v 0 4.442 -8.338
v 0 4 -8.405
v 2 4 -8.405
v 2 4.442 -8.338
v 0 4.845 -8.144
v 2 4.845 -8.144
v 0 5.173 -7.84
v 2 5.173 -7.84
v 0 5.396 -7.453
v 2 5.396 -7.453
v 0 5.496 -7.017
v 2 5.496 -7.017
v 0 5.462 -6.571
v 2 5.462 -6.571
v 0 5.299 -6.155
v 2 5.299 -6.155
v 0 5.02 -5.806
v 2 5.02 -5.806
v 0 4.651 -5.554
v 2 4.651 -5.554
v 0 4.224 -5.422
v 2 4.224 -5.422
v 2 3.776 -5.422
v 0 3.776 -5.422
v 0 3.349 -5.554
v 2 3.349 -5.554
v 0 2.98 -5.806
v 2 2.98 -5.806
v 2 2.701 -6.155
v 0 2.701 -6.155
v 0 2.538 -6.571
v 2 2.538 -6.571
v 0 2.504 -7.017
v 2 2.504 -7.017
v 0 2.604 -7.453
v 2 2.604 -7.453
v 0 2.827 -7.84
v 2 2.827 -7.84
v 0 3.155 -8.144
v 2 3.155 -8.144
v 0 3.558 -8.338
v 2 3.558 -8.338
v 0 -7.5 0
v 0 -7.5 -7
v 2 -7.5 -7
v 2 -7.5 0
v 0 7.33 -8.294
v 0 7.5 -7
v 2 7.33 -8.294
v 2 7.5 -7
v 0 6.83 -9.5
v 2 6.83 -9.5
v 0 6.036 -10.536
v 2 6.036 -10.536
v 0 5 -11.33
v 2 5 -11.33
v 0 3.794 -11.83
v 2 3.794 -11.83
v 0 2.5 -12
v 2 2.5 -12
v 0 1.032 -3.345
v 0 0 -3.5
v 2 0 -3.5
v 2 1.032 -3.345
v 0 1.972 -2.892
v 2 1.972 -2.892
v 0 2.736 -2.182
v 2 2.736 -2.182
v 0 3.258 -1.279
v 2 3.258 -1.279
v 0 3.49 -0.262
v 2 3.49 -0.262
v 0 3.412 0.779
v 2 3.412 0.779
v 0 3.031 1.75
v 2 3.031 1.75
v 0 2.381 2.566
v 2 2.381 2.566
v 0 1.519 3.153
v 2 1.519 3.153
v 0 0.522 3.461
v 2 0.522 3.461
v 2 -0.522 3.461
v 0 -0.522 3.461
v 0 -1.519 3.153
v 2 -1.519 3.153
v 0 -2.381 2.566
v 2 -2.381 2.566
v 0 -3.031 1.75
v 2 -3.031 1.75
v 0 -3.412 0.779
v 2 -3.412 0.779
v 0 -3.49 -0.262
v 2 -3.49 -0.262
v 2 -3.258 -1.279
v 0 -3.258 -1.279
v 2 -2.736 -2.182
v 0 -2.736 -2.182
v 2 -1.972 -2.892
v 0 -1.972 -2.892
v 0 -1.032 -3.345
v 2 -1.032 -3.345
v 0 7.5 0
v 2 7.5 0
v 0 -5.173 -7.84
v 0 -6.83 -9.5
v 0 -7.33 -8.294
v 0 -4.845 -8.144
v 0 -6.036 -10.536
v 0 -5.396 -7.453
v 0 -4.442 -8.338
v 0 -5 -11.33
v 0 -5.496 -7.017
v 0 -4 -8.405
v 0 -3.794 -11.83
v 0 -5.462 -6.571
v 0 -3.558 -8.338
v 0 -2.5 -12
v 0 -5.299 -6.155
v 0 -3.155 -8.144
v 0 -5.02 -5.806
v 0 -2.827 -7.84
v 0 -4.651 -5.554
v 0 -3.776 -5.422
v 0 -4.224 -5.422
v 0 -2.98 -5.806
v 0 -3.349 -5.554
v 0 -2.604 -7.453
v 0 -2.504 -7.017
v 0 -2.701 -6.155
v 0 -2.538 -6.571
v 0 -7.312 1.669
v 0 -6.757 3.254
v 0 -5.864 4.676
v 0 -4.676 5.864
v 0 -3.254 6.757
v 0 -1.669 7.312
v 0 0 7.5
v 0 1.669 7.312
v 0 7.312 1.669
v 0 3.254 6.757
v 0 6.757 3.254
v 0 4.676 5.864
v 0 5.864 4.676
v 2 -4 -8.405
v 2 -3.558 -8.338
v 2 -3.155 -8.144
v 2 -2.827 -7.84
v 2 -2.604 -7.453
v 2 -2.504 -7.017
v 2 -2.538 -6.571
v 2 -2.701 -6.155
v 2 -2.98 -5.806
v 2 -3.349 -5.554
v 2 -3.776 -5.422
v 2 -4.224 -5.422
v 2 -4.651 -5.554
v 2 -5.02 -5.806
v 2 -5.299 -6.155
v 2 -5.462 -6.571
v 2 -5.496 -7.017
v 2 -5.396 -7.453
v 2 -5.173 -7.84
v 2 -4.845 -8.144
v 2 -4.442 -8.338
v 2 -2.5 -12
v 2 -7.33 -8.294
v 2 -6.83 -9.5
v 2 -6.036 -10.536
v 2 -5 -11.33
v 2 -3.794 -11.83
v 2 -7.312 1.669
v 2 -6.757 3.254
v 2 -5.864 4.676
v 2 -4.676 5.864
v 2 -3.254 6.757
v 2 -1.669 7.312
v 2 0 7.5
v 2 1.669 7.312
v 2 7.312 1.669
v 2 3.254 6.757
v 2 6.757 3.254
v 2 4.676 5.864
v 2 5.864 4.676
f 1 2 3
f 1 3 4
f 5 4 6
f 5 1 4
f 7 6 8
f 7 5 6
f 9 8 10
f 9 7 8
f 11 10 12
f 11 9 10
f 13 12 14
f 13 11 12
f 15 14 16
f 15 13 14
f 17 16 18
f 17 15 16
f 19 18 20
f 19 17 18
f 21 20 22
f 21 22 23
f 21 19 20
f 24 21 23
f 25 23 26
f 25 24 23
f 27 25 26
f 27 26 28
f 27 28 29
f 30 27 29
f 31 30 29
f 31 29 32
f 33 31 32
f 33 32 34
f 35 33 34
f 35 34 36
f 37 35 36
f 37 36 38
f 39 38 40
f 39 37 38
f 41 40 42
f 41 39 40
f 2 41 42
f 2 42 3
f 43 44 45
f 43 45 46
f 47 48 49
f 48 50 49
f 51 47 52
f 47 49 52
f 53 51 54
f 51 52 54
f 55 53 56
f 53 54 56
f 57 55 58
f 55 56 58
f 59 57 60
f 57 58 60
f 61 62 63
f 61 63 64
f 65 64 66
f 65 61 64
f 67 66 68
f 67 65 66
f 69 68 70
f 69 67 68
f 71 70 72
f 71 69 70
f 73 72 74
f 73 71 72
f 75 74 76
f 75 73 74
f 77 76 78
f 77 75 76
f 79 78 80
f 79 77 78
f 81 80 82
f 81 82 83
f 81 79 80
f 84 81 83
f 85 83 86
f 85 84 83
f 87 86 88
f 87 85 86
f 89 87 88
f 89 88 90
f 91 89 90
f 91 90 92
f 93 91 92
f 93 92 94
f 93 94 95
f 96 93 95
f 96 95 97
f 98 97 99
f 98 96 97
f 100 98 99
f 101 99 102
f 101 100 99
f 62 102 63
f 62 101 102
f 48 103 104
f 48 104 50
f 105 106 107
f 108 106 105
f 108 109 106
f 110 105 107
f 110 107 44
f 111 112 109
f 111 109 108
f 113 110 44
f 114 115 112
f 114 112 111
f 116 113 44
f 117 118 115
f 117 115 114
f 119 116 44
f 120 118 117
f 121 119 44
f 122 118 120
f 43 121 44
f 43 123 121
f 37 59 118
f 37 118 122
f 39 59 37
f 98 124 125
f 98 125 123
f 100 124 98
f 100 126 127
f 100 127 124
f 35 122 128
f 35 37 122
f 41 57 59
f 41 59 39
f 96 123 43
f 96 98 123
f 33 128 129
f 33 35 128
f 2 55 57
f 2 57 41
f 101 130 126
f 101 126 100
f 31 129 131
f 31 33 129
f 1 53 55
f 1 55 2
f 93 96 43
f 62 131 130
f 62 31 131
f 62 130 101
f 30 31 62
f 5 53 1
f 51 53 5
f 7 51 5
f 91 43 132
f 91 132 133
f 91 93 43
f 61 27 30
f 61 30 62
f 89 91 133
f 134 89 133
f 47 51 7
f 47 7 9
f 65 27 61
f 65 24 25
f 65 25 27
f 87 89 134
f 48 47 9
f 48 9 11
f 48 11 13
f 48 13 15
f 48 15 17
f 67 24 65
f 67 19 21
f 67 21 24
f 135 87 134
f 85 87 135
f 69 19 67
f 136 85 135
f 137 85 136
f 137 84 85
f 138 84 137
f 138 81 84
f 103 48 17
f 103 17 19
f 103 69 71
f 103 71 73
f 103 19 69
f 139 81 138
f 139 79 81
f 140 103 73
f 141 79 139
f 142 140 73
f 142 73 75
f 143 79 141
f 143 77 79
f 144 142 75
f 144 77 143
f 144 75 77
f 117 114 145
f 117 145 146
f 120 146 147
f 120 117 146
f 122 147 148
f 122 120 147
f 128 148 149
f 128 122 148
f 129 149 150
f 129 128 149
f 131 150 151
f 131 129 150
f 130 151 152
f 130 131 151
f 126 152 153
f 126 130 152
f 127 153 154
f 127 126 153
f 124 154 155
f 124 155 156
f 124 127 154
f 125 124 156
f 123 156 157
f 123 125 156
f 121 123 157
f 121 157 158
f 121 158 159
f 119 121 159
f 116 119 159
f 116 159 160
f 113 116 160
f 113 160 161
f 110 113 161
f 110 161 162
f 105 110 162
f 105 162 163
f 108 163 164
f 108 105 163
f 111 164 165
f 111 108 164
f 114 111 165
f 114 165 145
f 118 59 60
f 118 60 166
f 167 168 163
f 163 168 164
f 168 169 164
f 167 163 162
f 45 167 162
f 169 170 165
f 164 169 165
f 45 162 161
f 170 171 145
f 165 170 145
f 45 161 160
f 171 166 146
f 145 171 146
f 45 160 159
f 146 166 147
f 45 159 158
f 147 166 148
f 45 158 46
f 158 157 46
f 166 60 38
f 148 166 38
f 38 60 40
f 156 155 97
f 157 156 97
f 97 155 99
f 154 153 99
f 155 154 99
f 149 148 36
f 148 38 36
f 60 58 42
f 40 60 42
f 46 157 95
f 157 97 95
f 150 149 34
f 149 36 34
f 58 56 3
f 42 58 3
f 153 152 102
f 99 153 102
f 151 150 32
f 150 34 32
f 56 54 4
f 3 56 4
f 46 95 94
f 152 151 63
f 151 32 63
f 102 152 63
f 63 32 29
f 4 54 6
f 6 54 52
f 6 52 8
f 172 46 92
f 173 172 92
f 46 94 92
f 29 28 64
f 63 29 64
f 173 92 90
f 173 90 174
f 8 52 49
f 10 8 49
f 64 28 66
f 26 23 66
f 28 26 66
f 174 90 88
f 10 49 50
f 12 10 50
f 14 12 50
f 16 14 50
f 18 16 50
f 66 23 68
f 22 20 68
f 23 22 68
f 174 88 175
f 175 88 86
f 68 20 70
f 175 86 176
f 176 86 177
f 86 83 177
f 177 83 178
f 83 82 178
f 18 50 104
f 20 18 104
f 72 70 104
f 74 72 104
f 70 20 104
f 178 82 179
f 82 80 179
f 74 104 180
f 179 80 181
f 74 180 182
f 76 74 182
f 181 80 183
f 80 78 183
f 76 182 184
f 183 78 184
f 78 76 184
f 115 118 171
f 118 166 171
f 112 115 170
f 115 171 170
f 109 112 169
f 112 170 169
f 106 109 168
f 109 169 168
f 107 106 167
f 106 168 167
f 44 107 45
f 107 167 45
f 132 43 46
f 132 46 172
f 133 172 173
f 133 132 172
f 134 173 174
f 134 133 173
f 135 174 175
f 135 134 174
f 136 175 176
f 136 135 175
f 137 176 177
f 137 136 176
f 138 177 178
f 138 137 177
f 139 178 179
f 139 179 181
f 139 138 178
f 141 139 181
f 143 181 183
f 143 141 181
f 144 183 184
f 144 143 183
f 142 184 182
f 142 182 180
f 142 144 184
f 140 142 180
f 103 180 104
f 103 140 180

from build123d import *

# Parameters (mm, degrees)
SKETCH1_R           = 1.5
SKETCH1_R_2         = 3.5
BOSS_EXTRUDE1_DEPTH = 2
FILLET1_R           = 5


with BuildPart() as part:
    # Sketch1 → Boss-Extrude1 (new body)
    with BuildSketch(Plane(origin=(0, 0, 0), x_dir=(0, 0, -1), z_dir=(1, 0, 0))):
        with BuildLine():
            Line((0, 7.5), (12, 7.5))
            Line((12, 7.5), (12, -7.5))
            Line((12, -7.5), (0, -7.5))
            ThreePointArc((0, -7.5), (-7.5, 0), (0, 7.5))
        make_face()
        with Locations((6.905099565, -4)):
            Circle(SKETCH1_R, mode=Mode.SUBTRACT)
        with Locations((6.905099565, 4)):
            Circle(SKETCH1_R, mode=Mode.SUBTRACT)
        Circle(SKETCH1_R_2, mode=Mode.SUBTRACT)
    extrude(amount=BOSS_EXTRUDE1_DEPTH)

    # Fillet1
    fillet1_edges = [part.edges().sort_by_distance(p)[0] for p in [
        (1, 7.5, -12),
        (1, -7.5, -12),
    ]]
    fillet(fillet1_edges, radius=FILLET1_R)


solid = part.part
